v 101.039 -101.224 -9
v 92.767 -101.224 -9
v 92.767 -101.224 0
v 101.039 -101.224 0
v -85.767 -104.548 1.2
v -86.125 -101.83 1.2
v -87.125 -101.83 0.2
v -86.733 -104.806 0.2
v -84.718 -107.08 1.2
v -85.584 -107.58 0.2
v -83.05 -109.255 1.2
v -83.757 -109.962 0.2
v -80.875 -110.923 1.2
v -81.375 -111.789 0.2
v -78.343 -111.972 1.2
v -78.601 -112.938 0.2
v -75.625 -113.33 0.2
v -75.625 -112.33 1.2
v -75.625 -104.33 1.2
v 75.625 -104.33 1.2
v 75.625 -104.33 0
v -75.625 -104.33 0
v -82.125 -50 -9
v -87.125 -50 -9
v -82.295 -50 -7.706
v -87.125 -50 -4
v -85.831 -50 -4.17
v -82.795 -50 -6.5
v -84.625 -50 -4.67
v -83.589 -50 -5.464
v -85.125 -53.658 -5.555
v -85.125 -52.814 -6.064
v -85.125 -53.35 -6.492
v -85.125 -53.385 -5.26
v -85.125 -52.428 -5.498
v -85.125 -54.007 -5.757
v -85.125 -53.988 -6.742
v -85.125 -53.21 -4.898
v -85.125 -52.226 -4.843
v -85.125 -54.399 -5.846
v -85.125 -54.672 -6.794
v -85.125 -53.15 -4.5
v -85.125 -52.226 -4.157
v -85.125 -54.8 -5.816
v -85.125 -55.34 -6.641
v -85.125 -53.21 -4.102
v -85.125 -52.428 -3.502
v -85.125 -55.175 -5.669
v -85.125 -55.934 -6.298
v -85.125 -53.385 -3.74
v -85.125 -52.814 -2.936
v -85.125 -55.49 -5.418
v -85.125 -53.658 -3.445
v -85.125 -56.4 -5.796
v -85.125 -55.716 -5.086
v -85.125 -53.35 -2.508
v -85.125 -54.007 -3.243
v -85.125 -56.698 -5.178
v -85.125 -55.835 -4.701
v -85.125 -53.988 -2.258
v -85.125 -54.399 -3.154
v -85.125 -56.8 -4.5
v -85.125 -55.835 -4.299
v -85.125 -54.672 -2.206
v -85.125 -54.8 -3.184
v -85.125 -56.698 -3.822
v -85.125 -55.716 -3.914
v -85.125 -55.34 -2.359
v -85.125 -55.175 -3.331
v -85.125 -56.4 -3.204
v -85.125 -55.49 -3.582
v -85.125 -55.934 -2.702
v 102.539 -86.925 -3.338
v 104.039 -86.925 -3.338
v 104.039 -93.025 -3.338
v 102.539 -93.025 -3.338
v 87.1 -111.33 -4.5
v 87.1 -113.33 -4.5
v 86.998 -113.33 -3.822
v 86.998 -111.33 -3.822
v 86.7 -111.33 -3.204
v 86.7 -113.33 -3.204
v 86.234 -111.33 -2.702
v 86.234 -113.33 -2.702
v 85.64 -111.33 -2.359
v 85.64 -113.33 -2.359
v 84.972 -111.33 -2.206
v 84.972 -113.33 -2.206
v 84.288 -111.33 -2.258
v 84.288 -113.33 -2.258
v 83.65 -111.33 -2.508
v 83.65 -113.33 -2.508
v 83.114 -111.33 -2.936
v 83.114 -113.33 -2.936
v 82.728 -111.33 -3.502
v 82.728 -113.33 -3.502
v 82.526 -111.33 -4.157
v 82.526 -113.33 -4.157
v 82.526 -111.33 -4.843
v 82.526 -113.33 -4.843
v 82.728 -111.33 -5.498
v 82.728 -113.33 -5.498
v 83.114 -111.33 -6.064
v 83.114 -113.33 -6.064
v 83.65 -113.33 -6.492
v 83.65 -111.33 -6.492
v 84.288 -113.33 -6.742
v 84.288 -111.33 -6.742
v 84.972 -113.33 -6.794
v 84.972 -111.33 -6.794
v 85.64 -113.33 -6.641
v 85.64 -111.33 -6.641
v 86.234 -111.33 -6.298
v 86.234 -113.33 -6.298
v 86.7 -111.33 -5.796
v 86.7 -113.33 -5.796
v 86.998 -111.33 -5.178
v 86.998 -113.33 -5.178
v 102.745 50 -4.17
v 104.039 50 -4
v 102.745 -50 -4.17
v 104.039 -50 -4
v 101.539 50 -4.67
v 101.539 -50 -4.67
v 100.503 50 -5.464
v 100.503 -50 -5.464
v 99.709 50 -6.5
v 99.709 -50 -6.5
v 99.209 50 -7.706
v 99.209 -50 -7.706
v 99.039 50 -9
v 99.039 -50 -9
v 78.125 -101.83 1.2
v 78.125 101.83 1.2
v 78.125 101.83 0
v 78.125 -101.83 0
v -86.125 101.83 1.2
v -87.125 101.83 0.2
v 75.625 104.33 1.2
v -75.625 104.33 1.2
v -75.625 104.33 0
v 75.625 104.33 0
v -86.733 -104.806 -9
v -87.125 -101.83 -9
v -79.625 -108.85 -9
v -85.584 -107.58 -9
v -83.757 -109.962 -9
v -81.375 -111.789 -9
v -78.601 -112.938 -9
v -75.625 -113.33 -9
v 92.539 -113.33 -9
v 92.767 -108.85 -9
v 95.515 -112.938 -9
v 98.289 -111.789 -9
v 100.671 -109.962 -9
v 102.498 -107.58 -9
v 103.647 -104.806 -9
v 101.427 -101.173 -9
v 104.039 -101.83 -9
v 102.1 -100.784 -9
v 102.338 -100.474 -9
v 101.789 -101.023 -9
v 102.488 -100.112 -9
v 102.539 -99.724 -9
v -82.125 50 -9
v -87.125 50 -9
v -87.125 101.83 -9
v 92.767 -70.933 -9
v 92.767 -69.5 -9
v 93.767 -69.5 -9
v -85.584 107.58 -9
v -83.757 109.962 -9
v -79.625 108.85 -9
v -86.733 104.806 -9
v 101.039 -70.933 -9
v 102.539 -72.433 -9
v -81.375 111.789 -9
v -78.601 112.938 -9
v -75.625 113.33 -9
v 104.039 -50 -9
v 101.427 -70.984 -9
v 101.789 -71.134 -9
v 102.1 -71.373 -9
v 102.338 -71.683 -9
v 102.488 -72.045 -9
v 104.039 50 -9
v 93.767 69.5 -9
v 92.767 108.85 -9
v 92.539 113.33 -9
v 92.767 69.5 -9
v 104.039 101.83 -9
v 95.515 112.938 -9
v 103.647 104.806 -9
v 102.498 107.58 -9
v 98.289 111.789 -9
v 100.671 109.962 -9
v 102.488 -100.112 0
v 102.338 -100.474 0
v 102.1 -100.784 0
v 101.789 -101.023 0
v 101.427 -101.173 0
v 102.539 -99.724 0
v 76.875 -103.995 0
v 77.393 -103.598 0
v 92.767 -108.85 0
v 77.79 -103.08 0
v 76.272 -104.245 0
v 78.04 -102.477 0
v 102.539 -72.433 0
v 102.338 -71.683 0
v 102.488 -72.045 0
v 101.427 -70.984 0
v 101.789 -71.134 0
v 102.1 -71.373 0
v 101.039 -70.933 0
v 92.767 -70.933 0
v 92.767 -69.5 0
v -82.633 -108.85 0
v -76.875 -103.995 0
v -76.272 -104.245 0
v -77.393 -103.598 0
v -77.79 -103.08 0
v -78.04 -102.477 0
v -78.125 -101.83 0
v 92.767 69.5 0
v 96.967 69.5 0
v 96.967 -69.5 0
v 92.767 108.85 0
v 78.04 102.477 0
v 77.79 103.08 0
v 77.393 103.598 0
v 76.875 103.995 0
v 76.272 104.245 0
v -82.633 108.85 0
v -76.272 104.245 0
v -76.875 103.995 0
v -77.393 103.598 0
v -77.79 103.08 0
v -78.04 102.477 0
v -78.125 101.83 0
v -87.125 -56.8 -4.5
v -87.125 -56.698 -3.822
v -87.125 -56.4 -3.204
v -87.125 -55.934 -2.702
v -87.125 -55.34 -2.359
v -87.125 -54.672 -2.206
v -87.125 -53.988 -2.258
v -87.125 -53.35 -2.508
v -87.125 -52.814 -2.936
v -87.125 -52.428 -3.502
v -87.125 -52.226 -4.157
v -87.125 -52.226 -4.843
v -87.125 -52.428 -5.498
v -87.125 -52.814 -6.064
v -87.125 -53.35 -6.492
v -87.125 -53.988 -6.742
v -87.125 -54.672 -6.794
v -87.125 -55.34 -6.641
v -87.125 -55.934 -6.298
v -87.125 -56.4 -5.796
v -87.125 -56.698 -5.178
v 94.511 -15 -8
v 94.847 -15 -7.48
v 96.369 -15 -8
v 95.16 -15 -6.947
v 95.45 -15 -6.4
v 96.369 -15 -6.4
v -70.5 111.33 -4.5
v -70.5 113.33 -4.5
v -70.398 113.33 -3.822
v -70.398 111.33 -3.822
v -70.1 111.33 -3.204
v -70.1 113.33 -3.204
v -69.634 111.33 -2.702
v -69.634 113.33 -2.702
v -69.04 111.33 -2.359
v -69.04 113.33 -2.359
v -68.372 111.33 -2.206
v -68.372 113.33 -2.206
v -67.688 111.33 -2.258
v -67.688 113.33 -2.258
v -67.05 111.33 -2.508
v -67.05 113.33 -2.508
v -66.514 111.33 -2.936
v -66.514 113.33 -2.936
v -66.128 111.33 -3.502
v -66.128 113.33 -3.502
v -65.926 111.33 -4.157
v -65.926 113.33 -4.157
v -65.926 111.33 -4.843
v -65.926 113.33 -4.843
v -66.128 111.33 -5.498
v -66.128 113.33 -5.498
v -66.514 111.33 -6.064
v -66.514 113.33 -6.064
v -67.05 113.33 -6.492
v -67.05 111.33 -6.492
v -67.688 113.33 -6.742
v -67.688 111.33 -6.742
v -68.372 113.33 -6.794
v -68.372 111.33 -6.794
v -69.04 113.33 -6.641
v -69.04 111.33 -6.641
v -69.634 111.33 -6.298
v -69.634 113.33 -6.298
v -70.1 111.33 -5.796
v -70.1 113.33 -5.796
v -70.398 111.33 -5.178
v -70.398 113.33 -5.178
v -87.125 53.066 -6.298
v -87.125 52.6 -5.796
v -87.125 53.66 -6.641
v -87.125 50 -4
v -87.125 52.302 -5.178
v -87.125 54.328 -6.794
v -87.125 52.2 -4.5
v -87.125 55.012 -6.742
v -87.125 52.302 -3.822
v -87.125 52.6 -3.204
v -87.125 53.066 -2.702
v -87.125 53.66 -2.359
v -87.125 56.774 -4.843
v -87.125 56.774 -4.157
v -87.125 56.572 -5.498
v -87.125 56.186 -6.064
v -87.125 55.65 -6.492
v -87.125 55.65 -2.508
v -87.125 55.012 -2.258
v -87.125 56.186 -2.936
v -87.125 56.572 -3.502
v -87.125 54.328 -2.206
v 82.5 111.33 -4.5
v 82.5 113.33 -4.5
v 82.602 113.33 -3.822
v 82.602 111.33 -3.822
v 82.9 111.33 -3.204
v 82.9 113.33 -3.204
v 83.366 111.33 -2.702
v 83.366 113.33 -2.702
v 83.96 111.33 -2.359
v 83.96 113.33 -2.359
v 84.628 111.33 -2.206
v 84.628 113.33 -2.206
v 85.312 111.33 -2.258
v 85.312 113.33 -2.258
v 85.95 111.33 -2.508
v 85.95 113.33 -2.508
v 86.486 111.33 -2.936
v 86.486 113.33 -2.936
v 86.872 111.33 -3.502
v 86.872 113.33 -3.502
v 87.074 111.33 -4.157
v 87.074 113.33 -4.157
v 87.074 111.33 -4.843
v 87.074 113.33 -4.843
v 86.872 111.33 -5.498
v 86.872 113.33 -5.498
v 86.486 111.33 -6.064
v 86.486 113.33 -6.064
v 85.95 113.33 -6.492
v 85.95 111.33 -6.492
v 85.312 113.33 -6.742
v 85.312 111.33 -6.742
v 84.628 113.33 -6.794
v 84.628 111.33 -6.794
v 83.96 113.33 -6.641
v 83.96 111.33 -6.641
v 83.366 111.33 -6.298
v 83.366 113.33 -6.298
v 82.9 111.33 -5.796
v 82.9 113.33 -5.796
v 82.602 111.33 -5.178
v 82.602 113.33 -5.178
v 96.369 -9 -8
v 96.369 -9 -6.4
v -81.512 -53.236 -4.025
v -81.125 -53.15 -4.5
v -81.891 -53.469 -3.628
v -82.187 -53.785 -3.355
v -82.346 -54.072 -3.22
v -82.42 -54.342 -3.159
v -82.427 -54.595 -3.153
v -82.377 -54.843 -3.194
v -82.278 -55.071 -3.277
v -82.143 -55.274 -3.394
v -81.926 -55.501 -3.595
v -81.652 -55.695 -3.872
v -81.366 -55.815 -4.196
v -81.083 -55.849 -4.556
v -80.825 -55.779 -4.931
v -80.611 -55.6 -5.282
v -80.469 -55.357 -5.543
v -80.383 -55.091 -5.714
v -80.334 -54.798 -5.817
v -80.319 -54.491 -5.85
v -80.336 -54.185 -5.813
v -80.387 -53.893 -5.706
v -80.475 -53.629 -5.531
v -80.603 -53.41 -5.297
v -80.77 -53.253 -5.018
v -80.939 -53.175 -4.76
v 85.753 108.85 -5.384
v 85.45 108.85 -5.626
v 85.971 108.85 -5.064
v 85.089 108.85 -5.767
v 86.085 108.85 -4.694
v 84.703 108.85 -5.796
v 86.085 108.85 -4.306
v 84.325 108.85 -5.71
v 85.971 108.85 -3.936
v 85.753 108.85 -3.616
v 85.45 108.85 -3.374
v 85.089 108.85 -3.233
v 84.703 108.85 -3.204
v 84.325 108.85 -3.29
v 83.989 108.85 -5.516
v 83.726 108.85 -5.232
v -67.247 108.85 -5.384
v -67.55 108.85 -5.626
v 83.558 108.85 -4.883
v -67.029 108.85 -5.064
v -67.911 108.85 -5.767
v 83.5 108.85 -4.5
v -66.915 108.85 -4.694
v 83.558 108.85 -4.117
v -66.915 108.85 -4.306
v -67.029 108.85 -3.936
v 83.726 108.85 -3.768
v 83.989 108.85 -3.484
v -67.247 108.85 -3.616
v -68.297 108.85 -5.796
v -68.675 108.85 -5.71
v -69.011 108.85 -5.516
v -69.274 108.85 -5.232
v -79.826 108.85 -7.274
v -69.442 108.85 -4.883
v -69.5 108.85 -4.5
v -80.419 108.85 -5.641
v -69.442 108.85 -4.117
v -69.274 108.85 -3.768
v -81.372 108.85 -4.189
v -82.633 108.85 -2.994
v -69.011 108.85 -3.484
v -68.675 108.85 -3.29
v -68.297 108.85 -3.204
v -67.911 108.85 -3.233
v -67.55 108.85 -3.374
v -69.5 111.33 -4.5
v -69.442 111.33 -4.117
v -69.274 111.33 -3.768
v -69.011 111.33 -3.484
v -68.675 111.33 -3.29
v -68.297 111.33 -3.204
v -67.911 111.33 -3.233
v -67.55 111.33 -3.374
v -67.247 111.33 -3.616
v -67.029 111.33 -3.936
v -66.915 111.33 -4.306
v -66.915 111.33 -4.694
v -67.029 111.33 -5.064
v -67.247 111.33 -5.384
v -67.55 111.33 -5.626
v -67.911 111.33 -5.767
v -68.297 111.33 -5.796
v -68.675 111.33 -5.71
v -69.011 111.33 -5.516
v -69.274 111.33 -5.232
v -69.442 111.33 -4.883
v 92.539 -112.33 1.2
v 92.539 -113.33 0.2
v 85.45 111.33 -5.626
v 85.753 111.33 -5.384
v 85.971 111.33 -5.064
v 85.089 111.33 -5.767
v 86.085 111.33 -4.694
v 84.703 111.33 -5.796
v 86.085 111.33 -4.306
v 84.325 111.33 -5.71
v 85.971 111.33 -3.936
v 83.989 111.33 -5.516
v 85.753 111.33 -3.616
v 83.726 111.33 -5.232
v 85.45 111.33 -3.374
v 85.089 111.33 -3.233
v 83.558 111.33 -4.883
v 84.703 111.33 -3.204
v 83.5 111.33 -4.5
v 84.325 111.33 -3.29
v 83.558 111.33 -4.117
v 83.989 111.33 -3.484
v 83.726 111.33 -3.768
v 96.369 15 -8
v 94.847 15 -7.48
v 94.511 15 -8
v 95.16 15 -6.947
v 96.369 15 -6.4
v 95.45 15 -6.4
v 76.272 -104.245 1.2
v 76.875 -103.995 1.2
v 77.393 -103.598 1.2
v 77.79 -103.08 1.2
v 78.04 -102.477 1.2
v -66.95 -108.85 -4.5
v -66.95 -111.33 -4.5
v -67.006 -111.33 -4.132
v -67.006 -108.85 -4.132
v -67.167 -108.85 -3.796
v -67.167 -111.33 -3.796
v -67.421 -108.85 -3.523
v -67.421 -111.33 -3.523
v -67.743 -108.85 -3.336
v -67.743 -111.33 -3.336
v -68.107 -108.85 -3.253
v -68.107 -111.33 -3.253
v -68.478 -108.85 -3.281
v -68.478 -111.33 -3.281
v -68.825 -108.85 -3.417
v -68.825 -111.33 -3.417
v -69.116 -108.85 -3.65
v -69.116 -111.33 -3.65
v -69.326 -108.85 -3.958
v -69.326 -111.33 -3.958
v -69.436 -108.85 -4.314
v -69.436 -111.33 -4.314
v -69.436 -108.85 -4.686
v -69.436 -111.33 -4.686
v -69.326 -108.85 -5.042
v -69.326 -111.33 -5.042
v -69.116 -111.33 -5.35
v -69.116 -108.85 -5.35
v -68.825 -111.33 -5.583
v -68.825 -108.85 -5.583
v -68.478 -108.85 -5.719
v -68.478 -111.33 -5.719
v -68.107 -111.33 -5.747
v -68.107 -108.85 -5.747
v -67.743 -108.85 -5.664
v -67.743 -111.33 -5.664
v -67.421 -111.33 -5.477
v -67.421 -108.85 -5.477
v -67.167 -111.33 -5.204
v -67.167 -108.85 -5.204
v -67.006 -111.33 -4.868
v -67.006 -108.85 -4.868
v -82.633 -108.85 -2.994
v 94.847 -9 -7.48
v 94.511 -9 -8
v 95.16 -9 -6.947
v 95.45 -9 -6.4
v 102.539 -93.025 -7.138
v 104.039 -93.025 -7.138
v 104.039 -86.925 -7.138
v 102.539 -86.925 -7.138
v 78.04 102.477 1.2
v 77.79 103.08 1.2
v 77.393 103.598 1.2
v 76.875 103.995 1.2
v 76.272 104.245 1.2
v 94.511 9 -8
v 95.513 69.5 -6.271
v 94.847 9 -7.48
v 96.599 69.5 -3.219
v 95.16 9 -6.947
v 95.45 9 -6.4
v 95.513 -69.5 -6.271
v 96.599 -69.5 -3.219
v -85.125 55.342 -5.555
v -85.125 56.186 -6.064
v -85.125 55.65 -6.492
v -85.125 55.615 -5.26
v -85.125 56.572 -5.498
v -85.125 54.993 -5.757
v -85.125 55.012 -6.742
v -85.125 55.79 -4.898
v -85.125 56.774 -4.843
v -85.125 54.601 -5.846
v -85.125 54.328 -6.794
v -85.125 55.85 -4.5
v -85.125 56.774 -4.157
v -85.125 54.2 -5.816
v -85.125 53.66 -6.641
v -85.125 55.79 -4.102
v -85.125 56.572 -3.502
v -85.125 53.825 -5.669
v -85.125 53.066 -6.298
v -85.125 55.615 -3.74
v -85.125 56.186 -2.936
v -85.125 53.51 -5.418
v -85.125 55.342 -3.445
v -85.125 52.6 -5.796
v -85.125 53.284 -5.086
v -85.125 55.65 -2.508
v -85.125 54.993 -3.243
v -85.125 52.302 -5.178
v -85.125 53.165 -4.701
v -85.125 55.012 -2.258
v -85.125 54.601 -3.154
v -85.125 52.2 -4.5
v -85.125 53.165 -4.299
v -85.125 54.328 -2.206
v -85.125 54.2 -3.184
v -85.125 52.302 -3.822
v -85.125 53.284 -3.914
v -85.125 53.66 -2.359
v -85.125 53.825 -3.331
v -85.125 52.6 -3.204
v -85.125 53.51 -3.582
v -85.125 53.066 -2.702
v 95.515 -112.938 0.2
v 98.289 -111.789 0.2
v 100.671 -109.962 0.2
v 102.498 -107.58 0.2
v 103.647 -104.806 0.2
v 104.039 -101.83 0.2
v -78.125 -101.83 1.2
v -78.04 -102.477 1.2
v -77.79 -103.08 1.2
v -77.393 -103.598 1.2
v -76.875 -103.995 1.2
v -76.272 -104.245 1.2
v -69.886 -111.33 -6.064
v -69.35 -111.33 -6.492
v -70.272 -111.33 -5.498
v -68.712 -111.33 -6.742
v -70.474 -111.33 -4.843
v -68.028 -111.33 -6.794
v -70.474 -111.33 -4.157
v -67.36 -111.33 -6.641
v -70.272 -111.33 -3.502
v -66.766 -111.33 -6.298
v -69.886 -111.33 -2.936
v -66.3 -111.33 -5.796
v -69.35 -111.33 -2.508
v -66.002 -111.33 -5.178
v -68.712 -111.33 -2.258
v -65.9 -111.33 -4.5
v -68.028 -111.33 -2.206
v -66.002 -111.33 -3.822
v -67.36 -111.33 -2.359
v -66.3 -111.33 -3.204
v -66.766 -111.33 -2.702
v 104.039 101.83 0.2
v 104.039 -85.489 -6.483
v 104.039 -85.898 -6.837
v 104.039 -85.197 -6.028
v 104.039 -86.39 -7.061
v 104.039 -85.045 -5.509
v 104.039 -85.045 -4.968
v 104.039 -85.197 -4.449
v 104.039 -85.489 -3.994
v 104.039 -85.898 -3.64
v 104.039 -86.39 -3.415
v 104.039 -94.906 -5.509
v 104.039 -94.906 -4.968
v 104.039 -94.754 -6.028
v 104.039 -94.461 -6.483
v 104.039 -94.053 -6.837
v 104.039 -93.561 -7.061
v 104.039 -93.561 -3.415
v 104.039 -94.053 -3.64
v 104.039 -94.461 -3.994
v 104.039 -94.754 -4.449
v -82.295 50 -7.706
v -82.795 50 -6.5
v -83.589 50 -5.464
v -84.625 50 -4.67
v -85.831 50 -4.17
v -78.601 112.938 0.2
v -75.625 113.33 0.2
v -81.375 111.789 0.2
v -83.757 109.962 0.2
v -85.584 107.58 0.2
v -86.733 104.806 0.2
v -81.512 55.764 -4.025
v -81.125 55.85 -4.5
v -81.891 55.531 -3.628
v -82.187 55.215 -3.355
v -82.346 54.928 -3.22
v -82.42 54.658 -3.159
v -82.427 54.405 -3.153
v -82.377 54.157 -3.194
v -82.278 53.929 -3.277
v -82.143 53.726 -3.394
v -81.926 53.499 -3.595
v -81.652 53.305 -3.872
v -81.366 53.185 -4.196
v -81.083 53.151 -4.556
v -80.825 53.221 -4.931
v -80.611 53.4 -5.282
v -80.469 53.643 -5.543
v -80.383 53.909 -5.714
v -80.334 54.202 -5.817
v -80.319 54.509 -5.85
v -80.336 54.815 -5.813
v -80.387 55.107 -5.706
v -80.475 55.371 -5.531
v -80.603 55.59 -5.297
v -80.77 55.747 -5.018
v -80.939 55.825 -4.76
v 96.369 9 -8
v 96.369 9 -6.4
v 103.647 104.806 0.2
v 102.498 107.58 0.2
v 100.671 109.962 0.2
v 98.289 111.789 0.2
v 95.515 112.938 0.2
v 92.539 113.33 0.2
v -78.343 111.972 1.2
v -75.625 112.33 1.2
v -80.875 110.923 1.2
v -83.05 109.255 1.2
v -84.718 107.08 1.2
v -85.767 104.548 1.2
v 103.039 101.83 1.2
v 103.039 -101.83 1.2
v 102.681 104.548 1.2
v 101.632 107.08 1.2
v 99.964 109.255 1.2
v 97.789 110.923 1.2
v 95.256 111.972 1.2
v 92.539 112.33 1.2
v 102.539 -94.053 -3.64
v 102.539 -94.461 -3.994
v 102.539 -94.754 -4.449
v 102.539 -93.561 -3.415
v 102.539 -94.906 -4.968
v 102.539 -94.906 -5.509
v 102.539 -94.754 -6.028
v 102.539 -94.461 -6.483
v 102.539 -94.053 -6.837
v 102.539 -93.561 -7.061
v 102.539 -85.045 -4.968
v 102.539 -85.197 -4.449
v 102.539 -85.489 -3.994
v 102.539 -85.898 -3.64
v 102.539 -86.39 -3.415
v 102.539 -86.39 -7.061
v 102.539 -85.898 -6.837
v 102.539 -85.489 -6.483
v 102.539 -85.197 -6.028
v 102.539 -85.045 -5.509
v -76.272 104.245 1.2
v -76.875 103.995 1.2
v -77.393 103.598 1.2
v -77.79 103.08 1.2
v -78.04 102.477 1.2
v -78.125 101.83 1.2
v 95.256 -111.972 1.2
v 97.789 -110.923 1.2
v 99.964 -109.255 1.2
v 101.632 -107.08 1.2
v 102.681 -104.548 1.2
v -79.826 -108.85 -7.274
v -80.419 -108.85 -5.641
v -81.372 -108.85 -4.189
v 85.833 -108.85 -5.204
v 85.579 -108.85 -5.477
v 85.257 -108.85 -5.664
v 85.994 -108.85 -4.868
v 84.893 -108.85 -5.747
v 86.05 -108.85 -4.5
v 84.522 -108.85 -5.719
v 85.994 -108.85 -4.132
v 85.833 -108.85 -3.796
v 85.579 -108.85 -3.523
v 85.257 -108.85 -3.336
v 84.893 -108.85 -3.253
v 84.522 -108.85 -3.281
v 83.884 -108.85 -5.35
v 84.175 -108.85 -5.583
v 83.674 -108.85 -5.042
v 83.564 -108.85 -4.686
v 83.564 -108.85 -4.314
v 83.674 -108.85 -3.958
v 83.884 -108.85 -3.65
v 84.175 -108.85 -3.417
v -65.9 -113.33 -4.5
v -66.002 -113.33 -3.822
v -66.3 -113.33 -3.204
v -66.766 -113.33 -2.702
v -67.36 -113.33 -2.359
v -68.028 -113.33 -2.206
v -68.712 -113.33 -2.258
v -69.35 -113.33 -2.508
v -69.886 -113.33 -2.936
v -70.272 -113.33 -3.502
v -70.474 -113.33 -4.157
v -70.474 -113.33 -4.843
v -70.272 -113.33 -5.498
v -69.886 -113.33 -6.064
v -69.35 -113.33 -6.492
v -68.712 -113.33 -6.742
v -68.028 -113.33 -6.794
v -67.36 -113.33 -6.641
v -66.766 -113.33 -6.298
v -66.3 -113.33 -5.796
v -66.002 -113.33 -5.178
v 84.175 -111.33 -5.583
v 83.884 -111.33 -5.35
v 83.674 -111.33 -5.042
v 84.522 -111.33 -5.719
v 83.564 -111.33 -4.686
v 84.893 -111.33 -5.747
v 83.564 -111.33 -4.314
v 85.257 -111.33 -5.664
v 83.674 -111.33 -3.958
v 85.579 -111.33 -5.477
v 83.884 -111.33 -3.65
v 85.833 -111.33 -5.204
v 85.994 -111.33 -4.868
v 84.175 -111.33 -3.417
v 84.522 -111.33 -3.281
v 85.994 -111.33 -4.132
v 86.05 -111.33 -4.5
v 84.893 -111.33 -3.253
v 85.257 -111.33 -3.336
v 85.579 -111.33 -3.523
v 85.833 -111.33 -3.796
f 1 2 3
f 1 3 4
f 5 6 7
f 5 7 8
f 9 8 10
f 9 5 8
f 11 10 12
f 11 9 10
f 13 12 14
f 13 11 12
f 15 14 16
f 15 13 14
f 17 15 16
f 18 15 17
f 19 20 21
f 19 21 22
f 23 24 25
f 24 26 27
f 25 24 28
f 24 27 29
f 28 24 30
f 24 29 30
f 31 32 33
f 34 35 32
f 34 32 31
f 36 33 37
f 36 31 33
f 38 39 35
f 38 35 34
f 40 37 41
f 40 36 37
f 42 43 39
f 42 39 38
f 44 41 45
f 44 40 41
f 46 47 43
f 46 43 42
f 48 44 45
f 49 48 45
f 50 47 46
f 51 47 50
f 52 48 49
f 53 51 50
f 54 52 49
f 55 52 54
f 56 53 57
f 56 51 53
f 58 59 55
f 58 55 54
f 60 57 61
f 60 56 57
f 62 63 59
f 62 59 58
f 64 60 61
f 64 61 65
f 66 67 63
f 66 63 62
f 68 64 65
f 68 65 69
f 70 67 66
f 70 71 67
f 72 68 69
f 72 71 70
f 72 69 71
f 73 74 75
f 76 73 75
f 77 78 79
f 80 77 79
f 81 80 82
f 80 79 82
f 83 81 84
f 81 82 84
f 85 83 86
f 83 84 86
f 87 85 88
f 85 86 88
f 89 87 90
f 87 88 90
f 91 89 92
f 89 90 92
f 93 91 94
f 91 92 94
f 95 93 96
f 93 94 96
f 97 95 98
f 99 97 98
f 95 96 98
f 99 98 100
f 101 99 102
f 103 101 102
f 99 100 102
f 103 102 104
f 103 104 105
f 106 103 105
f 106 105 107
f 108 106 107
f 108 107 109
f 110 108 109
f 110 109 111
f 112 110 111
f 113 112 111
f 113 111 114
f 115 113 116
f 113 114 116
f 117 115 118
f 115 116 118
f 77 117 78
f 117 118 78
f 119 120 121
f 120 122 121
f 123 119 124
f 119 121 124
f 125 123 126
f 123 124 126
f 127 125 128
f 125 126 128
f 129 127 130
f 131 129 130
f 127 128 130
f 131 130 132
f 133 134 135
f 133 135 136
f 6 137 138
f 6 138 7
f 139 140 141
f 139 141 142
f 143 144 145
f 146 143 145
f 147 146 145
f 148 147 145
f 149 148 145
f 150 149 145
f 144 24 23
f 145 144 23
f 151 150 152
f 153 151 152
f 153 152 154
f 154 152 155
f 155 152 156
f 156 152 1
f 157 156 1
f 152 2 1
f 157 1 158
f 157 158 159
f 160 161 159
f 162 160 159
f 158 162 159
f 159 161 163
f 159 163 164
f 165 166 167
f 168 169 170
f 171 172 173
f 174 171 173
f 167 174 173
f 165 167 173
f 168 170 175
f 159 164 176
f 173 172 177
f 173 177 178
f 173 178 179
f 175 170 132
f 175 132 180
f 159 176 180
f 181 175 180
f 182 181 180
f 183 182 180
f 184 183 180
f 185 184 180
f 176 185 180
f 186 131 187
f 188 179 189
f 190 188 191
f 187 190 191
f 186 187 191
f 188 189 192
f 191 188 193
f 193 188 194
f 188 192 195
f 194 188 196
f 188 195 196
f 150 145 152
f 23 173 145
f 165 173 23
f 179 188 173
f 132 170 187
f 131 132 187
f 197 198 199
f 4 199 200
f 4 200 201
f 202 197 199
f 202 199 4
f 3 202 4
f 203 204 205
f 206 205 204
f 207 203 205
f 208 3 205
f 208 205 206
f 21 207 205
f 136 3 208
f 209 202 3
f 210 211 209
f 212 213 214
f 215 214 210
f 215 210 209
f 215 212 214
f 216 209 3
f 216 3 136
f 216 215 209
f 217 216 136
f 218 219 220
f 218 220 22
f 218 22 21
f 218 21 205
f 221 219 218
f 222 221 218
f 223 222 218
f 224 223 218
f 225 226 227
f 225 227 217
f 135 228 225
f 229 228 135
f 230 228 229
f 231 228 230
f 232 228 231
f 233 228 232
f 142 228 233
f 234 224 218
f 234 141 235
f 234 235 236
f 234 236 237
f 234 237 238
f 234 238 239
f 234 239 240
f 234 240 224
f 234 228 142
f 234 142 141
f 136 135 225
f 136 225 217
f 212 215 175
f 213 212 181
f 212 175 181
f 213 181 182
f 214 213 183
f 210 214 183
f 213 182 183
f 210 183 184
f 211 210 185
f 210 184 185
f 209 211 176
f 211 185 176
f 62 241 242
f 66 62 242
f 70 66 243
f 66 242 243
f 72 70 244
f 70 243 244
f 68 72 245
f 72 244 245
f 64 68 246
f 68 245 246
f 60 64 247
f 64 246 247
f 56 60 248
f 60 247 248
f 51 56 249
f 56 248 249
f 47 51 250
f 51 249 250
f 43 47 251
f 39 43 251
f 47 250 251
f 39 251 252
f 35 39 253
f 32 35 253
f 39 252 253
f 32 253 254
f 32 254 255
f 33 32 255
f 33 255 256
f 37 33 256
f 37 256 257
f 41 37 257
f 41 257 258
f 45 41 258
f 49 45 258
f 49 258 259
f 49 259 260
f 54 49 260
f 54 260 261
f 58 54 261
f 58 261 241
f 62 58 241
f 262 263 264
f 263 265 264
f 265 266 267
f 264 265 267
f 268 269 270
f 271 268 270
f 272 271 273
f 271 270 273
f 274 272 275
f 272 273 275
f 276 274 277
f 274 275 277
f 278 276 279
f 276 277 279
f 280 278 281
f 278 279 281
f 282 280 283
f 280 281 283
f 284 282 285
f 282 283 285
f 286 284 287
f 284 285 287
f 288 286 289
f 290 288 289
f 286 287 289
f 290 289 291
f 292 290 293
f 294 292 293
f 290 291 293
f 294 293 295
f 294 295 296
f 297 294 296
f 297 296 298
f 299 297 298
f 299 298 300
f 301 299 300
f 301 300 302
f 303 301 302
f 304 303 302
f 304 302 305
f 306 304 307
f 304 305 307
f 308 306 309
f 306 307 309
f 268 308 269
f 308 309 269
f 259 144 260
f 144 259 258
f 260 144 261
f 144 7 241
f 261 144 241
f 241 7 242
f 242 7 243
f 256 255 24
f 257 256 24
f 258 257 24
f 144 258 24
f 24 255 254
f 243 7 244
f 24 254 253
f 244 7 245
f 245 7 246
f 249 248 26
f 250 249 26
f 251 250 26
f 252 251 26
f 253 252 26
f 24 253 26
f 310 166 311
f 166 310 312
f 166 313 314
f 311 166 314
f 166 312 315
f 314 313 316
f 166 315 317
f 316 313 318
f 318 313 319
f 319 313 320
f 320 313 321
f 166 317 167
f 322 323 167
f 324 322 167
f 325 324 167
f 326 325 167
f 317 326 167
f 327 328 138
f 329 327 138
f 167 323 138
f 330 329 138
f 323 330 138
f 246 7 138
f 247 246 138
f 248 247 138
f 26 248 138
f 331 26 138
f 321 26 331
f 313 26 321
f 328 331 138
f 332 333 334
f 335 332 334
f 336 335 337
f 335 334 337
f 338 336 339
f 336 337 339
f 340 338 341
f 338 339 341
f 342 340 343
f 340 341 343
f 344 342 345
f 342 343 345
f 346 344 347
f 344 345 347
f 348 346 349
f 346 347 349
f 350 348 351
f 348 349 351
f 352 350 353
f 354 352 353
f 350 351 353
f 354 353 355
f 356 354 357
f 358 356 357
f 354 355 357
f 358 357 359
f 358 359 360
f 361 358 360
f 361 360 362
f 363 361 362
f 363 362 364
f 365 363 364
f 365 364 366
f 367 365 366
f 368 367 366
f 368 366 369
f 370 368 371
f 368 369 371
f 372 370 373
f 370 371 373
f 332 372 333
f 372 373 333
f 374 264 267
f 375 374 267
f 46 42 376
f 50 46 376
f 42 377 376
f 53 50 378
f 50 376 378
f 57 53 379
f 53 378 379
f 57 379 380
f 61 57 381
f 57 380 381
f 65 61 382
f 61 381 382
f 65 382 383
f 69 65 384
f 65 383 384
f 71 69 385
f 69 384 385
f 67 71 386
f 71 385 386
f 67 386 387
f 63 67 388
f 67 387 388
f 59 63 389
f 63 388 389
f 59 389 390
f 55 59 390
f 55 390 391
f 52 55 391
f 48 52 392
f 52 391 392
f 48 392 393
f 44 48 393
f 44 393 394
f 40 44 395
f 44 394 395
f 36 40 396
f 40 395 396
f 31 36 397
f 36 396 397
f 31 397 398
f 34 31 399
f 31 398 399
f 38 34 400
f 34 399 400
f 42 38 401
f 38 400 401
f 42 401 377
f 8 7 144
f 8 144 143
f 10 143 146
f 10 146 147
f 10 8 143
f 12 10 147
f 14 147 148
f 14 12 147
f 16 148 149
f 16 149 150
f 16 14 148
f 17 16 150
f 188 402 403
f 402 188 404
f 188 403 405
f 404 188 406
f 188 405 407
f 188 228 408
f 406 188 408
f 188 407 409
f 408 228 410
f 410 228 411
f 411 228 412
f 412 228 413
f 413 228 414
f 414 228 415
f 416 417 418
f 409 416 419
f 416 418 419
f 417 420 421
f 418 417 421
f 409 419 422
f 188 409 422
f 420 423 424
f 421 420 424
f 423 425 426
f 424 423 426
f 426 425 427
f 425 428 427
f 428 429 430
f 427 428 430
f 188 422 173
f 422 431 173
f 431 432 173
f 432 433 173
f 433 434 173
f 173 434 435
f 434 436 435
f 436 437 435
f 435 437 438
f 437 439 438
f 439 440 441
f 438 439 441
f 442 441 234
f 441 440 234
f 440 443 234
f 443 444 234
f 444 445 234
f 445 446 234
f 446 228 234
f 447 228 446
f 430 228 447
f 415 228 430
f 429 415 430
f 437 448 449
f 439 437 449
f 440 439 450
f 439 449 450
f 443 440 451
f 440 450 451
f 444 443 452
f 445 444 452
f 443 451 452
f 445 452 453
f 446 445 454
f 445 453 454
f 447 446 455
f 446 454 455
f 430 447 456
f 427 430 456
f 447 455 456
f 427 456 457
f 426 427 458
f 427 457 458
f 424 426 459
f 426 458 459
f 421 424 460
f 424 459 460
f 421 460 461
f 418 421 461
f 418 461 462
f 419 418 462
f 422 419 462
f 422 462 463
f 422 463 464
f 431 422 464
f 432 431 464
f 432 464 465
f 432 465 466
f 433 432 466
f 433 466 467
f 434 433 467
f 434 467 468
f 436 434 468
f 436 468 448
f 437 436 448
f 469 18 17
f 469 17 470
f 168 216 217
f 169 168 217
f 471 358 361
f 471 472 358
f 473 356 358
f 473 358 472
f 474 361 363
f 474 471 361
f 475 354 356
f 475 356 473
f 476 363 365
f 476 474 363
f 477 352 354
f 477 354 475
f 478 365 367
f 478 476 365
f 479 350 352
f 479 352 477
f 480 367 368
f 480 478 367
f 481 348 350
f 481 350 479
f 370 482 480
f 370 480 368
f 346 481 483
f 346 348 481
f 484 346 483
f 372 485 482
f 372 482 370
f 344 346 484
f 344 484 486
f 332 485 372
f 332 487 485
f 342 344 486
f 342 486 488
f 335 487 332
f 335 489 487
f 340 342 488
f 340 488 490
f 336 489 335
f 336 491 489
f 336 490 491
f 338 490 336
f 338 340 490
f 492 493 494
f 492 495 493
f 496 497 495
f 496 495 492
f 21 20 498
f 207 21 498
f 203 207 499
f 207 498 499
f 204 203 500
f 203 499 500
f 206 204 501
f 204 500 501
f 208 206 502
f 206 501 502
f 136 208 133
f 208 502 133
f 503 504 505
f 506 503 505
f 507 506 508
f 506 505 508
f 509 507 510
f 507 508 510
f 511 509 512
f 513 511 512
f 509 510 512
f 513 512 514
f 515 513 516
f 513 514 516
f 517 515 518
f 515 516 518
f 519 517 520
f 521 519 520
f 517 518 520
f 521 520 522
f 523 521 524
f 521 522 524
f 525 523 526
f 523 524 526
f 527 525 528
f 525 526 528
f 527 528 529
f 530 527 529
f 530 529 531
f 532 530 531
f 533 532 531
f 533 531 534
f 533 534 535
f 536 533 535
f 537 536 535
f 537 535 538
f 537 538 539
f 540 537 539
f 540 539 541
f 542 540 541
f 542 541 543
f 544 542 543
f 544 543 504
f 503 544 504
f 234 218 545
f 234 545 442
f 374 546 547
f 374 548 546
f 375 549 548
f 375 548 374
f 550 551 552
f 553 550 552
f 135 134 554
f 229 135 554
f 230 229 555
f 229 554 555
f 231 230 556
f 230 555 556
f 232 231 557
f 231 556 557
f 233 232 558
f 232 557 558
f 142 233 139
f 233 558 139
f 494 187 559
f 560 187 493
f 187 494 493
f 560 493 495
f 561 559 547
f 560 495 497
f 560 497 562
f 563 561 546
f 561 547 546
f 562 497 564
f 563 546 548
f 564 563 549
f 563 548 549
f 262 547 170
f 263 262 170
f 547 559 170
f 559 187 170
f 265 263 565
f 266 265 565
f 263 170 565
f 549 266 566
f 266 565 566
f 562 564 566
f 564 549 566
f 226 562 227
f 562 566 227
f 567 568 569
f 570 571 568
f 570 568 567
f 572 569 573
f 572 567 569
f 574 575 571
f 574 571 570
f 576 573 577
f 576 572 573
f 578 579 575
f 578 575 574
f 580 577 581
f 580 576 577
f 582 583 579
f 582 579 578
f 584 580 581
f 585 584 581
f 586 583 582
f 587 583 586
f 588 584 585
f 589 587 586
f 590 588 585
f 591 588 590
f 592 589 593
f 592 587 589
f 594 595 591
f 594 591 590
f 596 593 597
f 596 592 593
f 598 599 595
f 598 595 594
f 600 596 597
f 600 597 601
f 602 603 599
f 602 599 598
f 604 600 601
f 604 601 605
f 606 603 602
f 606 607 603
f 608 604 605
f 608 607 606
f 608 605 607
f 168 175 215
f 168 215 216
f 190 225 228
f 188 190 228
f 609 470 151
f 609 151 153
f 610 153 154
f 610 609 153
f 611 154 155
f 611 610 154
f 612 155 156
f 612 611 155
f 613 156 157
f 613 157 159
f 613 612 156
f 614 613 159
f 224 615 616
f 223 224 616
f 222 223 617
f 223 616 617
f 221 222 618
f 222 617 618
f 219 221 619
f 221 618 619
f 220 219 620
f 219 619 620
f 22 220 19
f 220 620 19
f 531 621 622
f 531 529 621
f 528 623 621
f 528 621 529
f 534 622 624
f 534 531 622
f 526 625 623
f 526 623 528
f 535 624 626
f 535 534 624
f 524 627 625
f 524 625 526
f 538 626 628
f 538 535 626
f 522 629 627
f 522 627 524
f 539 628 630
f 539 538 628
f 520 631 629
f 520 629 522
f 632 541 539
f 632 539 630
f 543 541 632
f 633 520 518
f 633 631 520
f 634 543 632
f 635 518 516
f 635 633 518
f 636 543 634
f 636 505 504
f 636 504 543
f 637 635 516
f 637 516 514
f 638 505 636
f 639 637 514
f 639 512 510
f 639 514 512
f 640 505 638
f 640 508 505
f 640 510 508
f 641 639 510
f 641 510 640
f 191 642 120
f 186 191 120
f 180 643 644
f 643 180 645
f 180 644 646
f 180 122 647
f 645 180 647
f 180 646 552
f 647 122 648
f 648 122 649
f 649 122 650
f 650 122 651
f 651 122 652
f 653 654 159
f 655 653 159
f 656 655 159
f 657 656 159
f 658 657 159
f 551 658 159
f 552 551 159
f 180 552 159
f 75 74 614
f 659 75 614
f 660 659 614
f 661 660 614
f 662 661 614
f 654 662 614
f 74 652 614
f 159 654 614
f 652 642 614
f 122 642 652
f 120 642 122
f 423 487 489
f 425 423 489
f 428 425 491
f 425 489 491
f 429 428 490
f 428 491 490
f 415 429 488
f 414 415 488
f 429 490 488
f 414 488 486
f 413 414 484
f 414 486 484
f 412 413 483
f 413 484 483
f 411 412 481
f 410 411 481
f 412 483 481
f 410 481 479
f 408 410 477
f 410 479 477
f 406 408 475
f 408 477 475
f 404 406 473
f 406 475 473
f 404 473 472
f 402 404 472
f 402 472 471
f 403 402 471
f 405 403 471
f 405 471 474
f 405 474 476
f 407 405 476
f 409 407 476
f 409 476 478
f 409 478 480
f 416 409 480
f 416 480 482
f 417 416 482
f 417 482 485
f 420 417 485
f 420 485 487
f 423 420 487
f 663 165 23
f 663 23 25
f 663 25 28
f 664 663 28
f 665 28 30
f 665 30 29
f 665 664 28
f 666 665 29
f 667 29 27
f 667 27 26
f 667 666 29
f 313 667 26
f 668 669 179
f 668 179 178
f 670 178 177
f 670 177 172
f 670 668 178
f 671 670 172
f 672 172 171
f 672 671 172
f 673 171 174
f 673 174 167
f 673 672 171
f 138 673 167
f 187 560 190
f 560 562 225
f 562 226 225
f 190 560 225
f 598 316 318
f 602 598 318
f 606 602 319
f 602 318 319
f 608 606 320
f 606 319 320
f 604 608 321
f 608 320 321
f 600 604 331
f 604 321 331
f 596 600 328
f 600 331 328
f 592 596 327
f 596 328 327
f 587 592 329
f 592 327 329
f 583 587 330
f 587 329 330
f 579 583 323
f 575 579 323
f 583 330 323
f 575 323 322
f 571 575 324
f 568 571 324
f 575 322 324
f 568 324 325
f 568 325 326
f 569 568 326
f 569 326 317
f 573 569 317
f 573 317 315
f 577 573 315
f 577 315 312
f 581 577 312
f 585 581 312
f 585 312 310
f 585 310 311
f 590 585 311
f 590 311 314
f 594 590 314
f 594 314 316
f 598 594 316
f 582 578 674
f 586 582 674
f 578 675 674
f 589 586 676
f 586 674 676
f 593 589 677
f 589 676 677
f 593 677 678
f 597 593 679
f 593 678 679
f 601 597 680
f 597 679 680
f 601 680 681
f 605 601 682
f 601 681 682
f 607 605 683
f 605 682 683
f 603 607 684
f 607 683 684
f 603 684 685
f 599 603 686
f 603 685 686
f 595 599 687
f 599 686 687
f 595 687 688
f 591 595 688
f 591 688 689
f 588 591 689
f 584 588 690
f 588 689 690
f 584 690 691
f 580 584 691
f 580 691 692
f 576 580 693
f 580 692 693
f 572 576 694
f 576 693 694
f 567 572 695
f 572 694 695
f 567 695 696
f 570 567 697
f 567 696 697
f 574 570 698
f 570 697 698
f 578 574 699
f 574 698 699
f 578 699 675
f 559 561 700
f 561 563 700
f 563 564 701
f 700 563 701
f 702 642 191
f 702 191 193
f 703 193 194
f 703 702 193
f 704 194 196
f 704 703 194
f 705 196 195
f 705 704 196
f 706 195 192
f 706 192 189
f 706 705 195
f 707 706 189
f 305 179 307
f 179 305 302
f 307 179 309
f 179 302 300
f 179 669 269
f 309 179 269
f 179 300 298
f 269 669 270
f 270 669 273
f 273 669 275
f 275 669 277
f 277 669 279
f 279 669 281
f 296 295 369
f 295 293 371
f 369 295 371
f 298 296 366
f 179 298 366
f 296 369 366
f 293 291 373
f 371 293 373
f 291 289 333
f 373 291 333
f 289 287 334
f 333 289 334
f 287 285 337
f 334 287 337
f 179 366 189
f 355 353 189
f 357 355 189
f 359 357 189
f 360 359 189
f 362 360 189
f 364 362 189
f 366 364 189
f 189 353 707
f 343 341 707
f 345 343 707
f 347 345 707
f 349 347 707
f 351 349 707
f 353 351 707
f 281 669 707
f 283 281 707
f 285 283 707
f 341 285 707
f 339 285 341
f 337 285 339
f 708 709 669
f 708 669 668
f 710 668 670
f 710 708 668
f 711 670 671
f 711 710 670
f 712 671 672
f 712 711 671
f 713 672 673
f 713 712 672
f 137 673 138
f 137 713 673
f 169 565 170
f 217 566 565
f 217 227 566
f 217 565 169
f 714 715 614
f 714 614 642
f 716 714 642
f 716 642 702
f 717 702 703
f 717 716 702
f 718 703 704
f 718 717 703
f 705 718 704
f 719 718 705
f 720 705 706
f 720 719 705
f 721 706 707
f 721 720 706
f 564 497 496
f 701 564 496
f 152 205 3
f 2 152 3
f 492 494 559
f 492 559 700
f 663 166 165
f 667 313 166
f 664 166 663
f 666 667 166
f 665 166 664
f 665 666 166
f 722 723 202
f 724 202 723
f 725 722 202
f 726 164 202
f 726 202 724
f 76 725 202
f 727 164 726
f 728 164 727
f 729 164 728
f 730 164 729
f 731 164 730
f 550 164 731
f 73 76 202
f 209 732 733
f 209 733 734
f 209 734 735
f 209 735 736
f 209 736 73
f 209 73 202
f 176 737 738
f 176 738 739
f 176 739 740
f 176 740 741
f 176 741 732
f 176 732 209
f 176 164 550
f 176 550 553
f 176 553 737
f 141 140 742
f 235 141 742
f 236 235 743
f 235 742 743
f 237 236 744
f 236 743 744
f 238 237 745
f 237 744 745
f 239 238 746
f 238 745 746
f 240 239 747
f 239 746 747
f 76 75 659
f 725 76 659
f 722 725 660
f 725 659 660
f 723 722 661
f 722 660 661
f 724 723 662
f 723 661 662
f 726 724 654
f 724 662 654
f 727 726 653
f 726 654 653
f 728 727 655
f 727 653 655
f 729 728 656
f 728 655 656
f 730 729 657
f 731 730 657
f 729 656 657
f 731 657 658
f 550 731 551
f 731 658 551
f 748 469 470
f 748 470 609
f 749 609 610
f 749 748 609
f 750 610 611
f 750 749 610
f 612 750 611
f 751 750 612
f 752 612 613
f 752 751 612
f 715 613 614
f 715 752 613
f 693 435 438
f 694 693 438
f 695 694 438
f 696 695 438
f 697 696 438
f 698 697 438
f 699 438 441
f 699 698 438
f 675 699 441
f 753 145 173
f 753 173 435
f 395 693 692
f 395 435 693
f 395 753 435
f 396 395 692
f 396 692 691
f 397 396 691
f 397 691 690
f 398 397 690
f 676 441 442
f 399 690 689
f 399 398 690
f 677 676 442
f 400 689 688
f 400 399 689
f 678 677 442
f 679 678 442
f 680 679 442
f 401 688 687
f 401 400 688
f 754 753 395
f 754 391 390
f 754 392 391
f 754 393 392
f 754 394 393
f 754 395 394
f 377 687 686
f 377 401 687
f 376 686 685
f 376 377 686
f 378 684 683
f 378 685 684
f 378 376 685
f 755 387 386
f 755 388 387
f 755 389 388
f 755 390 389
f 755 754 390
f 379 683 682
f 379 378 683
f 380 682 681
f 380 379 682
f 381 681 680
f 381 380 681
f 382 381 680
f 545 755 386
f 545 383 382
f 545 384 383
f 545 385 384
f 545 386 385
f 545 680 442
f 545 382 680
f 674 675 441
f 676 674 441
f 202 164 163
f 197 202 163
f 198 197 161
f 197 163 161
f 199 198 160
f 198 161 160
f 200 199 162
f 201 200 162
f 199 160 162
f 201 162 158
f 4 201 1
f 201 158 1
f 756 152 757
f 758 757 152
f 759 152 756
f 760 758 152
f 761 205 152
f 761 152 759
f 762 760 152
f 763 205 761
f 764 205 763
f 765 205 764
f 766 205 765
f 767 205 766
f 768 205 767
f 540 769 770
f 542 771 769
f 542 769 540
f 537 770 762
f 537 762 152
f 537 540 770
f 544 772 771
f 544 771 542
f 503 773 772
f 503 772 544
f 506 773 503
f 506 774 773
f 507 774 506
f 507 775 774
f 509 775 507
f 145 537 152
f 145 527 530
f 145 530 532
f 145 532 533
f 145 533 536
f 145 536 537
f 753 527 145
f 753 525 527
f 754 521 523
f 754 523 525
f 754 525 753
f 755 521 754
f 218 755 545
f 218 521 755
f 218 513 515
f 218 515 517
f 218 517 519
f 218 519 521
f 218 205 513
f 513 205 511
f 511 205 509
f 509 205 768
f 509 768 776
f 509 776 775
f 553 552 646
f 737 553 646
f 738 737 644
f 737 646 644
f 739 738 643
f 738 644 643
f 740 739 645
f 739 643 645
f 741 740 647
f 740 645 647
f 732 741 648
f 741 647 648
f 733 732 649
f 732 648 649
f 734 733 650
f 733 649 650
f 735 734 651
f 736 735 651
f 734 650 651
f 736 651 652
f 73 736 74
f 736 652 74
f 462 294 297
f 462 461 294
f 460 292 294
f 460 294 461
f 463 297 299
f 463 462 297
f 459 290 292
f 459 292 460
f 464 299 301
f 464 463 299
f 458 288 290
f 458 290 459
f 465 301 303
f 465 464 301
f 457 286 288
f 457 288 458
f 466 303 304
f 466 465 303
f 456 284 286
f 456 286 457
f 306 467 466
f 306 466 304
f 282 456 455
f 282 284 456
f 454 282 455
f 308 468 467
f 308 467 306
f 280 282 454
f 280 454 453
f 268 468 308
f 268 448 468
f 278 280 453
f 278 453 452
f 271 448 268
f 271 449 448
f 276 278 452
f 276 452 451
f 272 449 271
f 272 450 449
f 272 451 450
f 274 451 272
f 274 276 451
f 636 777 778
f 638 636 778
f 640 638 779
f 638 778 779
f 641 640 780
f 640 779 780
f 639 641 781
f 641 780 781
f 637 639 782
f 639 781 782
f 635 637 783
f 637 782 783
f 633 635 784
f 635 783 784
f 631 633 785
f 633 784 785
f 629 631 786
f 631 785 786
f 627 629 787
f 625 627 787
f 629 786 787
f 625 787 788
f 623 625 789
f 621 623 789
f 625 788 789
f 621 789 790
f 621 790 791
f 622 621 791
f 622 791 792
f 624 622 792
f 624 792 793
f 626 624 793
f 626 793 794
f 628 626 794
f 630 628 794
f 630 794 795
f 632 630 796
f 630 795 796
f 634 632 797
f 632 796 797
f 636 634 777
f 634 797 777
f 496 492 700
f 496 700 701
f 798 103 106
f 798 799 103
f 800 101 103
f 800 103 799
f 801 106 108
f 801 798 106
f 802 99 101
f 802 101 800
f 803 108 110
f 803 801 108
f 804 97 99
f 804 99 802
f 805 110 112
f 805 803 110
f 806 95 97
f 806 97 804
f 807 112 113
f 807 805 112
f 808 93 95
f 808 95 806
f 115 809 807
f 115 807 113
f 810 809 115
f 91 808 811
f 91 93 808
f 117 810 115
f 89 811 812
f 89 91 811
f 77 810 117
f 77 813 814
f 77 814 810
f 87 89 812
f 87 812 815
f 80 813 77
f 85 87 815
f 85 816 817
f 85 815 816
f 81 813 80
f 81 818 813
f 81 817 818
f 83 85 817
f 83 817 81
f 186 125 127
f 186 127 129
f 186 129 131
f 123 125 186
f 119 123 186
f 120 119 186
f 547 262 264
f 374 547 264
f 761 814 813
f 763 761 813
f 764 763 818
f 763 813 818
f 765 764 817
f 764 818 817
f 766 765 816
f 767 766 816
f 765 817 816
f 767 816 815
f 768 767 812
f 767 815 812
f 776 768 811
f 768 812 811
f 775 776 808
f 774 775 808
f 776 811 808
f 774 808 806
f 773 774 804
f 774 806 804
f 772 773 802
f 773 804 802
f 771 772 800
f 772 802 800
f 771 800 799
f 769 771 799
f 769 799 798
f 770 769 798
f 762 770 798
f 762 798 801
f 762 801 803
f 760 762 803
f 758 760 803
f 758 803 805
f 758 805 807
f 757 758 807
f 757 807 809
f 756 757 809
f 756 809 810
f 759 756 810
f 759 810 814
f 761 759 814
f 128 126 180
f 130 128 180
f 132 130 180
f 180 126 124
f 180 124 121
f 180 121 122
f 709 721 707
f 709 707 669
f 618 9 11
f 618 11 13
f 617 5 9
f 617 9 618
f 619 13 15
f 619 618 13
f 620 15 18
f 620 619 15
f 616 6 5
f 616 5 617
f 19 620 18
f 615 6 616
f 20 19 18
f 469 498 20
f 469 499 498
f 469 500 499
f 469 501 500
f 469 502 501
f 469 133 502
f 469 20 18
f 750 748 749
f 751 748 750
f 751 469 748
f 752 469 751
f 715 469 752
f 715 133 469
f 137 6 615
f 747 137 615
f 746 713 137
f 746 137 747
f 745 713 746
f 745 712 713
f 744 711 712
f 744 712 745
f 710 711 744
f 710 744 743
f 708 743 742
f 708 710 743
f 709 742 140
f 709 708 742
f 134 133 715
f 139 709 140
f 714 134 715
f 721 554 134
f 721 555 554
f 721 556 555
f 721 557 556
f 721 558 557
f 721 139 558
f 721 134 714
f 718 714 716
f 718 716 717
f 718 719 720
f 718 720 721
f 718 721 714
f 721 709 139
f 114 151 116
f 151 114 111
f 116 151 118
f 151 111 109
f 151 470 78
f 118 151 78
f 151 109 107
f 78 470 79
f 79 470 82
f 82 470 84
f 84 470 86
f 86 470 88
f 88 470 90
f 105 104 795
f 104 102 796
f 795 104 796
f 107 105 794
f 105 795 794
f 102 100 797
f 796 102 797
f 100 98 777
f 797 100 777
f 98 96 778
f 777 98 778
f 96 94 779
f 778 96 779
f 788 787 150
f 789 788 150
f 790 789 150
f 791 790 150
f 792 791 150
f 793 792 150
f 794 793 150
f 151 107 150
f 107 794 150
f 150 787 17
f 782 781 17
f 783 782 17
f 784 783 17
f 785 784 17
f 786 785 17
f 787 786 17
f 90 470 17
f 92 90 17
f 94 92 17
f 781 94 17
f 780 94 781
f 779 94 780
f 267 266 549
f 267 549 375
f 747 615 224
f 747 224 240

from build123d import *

# Parameters (mm, degrees)
PAD004_DEPTH      = 1.2
PAD004_DEPTH_BACK = 9
SKETCH007_W       = 175.4
SKETCH007_H       = 217.7
POCKET001_DEPTH   = 19
PAD005_DEPTH      = 110
POCKET002_DEPTH   = 50
POCKET003_DEPTH   = 69.5
POCKET004_DEPTH   = 17
POCKET005_DEPTH   = 9.2
SKETCH034_R       = 2.3
POCKET023_DEPTH   = 2
SKETCH035_R       = 1.25
POCKET024_DEPTH   = 16
SKETCH037_R       = 2.3
POCKET026_DEPTH   = 2
SKETCH038_R       = 1.3
POCKET027_DEPTH   = 20
CHAMFER002_SIZE   = 1
HOLE_D            = 2.7
HOLE_DEPTH        = 25
HOLE_CBORE_D      = 4.6
HOLE_CBORE_DEPTH  = 2
HOLE_TIPS_R       = 1.35
SKETCH058_W       = 4.368927
SKETCH058_H       = 1.6
POCKET037_DEPTH   = 3


with BuildPart() as part:
    # Sketch006 → Pad004 (new body, two sides)
    with BuildSketch(Plane.XY) as pad004_sk:
        with BuildLine():
            ThreePointArc((-75.625, 113.33), (-83.756728, 109.961728), (-87.125, 101.83))
            Line((-87.125, -101.83), (-87.125, 101.83))
            ThreePointArc((-87.125, -101.83), (-83.756728, -109.961728), (-75.625, -113.33))
            Line((92.538879, -113.33), (-75.625, -113.33))
            ThreePointArc((92.538879, -113.33), (100.670607, -109.961728), (104.038879, -101.83))
            Line((104.038879, 101.83), (104.038879, -101.83))
            ThreePointArc((104.038879, 101.83), (100.670607, 109.961728), (92.538879, 113.33))
            Line((-75.625, 113.33), (92.538879, 113.33))
        make_face()
        with BuildLine():
            ThreePointArc((-75.625, 104.33), (-77.392767, 103.597767), (-78.125, 101.83))
            Line((-78.125, -101.83), (-78.125, 101.83))
            ThreePointArc((-78.125, -101.83), (-77.392767, -103.597767), (-75.625, -104.33))
            Line((75.625, -104.33), (-75.625, -104.33))
            ThreePointArc((75.625, -104.33), (77.392767, -103.597767), (78.125, -101.83))
            Line((78.125, 101.83), (78.125, -101.83))
            ThreePointArc((78.125, 101.83), (77.392767, 103.597767), (75.625, 104.33))
            Line((-75.625, 104.33), (75.625, 104.33))
        make_face(mode=Mode.SUBTRACT)
    extrude(amount=PAD004_DEPTH)
    extrude(pad004_sk.sketch, amount=-PAD004_DEPTH_BACK)

    # Sketch007 → Pocket001 (cut)
    with BuildSketch(Plane(origin=(0, 0, 0), x_dir=(-1, 0, 0), z_dir=(0, 0, -1))):
        with Locations((-5.066844, 0)):
            Rectangle(SKETCH007_W, SKETCH007_H)
    extrude(amount=POCKET001_DEPTH, mode=Mode.SUBTRACT)

    # Sketch008 → Pad005 (join, symmetric)
    with BuildSketch(Plane.XZ):
        with BuildLine():
            ThreePointArc((-79.625, -9), (-80.634367, -5.242118), (-83.390781, -2.495724))
            Line((-83.390781, -2.495724), (-83.390781, -9))
            Line((-79.625, -9), (-83.390781, -9))
        make_face()
    extrude(amount=PAD005_DEPTH, both=True)

    # Sketch009 → Pocket002 (cut, symmetric)
    with BuildSketch(Plane.XZ):
        with BuildLine():
            ThreePointArc((-82.125, -9), (-83.589466, -5.464466), (-87.125, -4))
            Line((-87.125, -9), (-87.125, -4))
            Line((-82.125, -9), (-87.125, -9))
        make_face()
        with BuildLine():
            ThreePointArc((104.038879, -4), (100.503345, -5.464466), (99.038879, -9))
            Line((99.038879, -9), (104.038879, -9))
            Line((104.038879, -9), (104.038879, -4))
        make_face()
    extrude(amount=POCKET002_DEPTH, both=True, mode=Mode.SUBTRACT)

    # Sketch010 → Pocket003 (cut, symmetric)
    with BuildSketch(Plane.XZ):
        with BuildLine():
            Line((92.766844, 0), (96.966844, 0))
            ThreePointArc((93.766844, -9), (96.143042, -4.775982), (96.966844, 0))
            Line((92.766844, -9), (93.766844, -9))
            Line((92.766844, -8), (92.766844, -9))
            Line((92.766844, -8), (92.766844, 0))
        make_face()
    extrude(amount=POCKET003_DEPTH, both=True, mode=Mode.SUBTRACT)

    # Sketch011 (on DatumPlane) → Pocket004 (cut)
    with BuildSketch(Plane.YZ.offset(104.038879)):
        with BuildLine():
            ThreePointArc((-93.025352, -3.338275), (-94.925352, -5.238275), (-93.025352, -7.138275))
            Line((-93.025352, -7.138275), (-86.925352, -7.138275))
            ThreePointArc((-86.925352, -7.138275), (-85.025352, -5.238275), (-86.925352, -3.338275))
            Line((-86.925352, -3.338275), (-93.025352, -3.338275))
        make_face()
    extrude(amount=-POCKET004_DEPTH, mode=Mode.SUBTRACT)

    # Sketch012 (on DatumPlane) → Pocket005 (cut)
    with BuildSketch(Plane(origin=(0, 0, -9.2), x_dir=(1, 0, 0), z_dir=(0, 0, -1))):
        with BuildLine():
            ThreePointArc((102.538879, 99.723724), (102.099539, 100.784384), (101.038879, 101.223724))
            Line((49.822763, 101.223724), (101.038879, 101.223724))
            ThreePointArc((49.822763, 101.223724), (48.762103, 100.784384), (48.322763, 99.723724))
            Line((48.322763, 72.43325), (48.322763, 99.723724))
            ThreePointArc((48.322763, 72.43325), (48.762103, 71.37259), (49.822763, 70.93325))
            Line((101.038879, 70.93325), (49.822763, 70.93325))
            ThreePointArc((101.038879, 70.93325), (102.099539, 71.37259), (102.538879, 72.43325))
            Line((102.538879, 99.723724), (102.538879, 72.43325))
        make_face()
    extrude(amount=-POCKET005_DEPTH, mode=Mode.SUBTRACT)

    # Sketch034 (on DatumPlane) → Pocket023 (cut)
    with BuildSketch(Plane.XZ.offset(113.33)):
        with Locations((-68.2, -4.5)):
            Circle(SKETCH034_R)
        with Locations((84.8, -4.5)):
            Circle(SKETCH034_R)
    extrude(amount=-POCKET023_DEPTH, mode=Mode.SUBTRACT)

    # Sketch035 (on DatumPlane) → Pocket024 (cut)
    with BuildSketch(Plane.XZ.offset(113.33)):
        with Locations((84.8, -4.5)):
            Circle(SKETCH035_R)
        with Locations((-68.2, -4.5)):
            Circle(SKETCH035_R)
    extrude(amount=-POCKET024_DEPTH, mode=Mode.SUBTRACT)

    # Sketch037 (on DatumPlane) → Pocket026 (cut)
    with BuildSketch(Plane(origin=(0, 113.33, 0), x_dir=(-1, 0, 0), z_dir=(0, 1, 0))):
        with Locations((-84.8, -4.5)):
            Circle(SKETCH037_R)
        with Locations((68.2, -4.5)):
            Circle(SKETCH037_R)
    extrude(amount=-POCKET026_DEPTH, mode=Mode.SUBTRACT)

    # Sketch038 (on DatumPlane) → Pocket027 (cut)
    with BuildSketch(Plane(origin=(0, 113.33, 0), x_dir=(-1, 0, 0), z_dir=(0, 1, 0))):
        with Locations((-84.8, -4.5)):
            Circle(SKETCH038_R)
        with Locations((68.2, -4.5)):
            Circle(SKETCH038_R)
    extrude(amount=-POCKET027_DEPTH, mode=Mode.SUBTRACT)

    # Chamfer002
    chamfer002_edges = [part.edges().sort_by_distance(p)[0] for p in [
        (100.670607, 109.961728, 1.2),
    ]]
    chamfer(chamfer002_edges, length=CHAMFER002_SIZE)

    # Hole
    with Locations(Plane(origin=(-87.125, 0, 0), x_dir=(0, -1, 0), z_dir=(-1, 0, 0))):
        with Locations((-54.5, -4.5), (54.5, -4.5)):
            CounterBoreHole(HOLE_D / 2, HOLE_CBORE_D / 2, HOLE_CBORE_DEPTH, depth=HOLE_DEPTH)

    # Hole tips → Hole tip 1 section 0
    with BuildSketch(Plane(origin=(-62.125, 0, 0), x_dir=(0, -1, 0), z_dir=(-1, 0, 0)), mode=Mode.PRIVATE) as hole_tip_1_s0:
        with Locations((-54.5, -4.5)):
            Circle(HOLE_TIPS_R)
    loft([hole_tip_1_s0.sketch, Vertex(-61.313838, 54.5, -4.5)], mode=Mode.SUBTRACT)

    # Hole tips → Hole tip 2 section 0
    with BuildSketch(Plane(origin=(-62.125, 0, 0), x_dir=(0, -1, 0), z_dir=(-1, 0, 0)), mode=Mode.PRIVATE) as hole_tip_2_s0:
        with Locations((54.5, -4.5)):
            Circle(HOLE_TIPS_R)
    loft([hole_tip_2_s0.sketch, Vertex(-61.313838, -54.5, -4.5)], mode=Mode.SUBTRACT)

    # Sketch058 → Pocket037 (cut, symmetric)
    with BuildSketch(Plane.XZ.offset(12)):
        with Locations((94.184463, -7.2)):
            Rectangle(SKETCH058_W, SKETCH058_H)
    pocket037 = extrude(amount=POCKET037_DEPTH, both=True, mode=Mode.SUBTRACT)

    # Mirrored: Pocket037 across XZ
    add(pocket037.mirror(Plane.XZ), mode=Mode.SUBTRACT)


solid = part.part
